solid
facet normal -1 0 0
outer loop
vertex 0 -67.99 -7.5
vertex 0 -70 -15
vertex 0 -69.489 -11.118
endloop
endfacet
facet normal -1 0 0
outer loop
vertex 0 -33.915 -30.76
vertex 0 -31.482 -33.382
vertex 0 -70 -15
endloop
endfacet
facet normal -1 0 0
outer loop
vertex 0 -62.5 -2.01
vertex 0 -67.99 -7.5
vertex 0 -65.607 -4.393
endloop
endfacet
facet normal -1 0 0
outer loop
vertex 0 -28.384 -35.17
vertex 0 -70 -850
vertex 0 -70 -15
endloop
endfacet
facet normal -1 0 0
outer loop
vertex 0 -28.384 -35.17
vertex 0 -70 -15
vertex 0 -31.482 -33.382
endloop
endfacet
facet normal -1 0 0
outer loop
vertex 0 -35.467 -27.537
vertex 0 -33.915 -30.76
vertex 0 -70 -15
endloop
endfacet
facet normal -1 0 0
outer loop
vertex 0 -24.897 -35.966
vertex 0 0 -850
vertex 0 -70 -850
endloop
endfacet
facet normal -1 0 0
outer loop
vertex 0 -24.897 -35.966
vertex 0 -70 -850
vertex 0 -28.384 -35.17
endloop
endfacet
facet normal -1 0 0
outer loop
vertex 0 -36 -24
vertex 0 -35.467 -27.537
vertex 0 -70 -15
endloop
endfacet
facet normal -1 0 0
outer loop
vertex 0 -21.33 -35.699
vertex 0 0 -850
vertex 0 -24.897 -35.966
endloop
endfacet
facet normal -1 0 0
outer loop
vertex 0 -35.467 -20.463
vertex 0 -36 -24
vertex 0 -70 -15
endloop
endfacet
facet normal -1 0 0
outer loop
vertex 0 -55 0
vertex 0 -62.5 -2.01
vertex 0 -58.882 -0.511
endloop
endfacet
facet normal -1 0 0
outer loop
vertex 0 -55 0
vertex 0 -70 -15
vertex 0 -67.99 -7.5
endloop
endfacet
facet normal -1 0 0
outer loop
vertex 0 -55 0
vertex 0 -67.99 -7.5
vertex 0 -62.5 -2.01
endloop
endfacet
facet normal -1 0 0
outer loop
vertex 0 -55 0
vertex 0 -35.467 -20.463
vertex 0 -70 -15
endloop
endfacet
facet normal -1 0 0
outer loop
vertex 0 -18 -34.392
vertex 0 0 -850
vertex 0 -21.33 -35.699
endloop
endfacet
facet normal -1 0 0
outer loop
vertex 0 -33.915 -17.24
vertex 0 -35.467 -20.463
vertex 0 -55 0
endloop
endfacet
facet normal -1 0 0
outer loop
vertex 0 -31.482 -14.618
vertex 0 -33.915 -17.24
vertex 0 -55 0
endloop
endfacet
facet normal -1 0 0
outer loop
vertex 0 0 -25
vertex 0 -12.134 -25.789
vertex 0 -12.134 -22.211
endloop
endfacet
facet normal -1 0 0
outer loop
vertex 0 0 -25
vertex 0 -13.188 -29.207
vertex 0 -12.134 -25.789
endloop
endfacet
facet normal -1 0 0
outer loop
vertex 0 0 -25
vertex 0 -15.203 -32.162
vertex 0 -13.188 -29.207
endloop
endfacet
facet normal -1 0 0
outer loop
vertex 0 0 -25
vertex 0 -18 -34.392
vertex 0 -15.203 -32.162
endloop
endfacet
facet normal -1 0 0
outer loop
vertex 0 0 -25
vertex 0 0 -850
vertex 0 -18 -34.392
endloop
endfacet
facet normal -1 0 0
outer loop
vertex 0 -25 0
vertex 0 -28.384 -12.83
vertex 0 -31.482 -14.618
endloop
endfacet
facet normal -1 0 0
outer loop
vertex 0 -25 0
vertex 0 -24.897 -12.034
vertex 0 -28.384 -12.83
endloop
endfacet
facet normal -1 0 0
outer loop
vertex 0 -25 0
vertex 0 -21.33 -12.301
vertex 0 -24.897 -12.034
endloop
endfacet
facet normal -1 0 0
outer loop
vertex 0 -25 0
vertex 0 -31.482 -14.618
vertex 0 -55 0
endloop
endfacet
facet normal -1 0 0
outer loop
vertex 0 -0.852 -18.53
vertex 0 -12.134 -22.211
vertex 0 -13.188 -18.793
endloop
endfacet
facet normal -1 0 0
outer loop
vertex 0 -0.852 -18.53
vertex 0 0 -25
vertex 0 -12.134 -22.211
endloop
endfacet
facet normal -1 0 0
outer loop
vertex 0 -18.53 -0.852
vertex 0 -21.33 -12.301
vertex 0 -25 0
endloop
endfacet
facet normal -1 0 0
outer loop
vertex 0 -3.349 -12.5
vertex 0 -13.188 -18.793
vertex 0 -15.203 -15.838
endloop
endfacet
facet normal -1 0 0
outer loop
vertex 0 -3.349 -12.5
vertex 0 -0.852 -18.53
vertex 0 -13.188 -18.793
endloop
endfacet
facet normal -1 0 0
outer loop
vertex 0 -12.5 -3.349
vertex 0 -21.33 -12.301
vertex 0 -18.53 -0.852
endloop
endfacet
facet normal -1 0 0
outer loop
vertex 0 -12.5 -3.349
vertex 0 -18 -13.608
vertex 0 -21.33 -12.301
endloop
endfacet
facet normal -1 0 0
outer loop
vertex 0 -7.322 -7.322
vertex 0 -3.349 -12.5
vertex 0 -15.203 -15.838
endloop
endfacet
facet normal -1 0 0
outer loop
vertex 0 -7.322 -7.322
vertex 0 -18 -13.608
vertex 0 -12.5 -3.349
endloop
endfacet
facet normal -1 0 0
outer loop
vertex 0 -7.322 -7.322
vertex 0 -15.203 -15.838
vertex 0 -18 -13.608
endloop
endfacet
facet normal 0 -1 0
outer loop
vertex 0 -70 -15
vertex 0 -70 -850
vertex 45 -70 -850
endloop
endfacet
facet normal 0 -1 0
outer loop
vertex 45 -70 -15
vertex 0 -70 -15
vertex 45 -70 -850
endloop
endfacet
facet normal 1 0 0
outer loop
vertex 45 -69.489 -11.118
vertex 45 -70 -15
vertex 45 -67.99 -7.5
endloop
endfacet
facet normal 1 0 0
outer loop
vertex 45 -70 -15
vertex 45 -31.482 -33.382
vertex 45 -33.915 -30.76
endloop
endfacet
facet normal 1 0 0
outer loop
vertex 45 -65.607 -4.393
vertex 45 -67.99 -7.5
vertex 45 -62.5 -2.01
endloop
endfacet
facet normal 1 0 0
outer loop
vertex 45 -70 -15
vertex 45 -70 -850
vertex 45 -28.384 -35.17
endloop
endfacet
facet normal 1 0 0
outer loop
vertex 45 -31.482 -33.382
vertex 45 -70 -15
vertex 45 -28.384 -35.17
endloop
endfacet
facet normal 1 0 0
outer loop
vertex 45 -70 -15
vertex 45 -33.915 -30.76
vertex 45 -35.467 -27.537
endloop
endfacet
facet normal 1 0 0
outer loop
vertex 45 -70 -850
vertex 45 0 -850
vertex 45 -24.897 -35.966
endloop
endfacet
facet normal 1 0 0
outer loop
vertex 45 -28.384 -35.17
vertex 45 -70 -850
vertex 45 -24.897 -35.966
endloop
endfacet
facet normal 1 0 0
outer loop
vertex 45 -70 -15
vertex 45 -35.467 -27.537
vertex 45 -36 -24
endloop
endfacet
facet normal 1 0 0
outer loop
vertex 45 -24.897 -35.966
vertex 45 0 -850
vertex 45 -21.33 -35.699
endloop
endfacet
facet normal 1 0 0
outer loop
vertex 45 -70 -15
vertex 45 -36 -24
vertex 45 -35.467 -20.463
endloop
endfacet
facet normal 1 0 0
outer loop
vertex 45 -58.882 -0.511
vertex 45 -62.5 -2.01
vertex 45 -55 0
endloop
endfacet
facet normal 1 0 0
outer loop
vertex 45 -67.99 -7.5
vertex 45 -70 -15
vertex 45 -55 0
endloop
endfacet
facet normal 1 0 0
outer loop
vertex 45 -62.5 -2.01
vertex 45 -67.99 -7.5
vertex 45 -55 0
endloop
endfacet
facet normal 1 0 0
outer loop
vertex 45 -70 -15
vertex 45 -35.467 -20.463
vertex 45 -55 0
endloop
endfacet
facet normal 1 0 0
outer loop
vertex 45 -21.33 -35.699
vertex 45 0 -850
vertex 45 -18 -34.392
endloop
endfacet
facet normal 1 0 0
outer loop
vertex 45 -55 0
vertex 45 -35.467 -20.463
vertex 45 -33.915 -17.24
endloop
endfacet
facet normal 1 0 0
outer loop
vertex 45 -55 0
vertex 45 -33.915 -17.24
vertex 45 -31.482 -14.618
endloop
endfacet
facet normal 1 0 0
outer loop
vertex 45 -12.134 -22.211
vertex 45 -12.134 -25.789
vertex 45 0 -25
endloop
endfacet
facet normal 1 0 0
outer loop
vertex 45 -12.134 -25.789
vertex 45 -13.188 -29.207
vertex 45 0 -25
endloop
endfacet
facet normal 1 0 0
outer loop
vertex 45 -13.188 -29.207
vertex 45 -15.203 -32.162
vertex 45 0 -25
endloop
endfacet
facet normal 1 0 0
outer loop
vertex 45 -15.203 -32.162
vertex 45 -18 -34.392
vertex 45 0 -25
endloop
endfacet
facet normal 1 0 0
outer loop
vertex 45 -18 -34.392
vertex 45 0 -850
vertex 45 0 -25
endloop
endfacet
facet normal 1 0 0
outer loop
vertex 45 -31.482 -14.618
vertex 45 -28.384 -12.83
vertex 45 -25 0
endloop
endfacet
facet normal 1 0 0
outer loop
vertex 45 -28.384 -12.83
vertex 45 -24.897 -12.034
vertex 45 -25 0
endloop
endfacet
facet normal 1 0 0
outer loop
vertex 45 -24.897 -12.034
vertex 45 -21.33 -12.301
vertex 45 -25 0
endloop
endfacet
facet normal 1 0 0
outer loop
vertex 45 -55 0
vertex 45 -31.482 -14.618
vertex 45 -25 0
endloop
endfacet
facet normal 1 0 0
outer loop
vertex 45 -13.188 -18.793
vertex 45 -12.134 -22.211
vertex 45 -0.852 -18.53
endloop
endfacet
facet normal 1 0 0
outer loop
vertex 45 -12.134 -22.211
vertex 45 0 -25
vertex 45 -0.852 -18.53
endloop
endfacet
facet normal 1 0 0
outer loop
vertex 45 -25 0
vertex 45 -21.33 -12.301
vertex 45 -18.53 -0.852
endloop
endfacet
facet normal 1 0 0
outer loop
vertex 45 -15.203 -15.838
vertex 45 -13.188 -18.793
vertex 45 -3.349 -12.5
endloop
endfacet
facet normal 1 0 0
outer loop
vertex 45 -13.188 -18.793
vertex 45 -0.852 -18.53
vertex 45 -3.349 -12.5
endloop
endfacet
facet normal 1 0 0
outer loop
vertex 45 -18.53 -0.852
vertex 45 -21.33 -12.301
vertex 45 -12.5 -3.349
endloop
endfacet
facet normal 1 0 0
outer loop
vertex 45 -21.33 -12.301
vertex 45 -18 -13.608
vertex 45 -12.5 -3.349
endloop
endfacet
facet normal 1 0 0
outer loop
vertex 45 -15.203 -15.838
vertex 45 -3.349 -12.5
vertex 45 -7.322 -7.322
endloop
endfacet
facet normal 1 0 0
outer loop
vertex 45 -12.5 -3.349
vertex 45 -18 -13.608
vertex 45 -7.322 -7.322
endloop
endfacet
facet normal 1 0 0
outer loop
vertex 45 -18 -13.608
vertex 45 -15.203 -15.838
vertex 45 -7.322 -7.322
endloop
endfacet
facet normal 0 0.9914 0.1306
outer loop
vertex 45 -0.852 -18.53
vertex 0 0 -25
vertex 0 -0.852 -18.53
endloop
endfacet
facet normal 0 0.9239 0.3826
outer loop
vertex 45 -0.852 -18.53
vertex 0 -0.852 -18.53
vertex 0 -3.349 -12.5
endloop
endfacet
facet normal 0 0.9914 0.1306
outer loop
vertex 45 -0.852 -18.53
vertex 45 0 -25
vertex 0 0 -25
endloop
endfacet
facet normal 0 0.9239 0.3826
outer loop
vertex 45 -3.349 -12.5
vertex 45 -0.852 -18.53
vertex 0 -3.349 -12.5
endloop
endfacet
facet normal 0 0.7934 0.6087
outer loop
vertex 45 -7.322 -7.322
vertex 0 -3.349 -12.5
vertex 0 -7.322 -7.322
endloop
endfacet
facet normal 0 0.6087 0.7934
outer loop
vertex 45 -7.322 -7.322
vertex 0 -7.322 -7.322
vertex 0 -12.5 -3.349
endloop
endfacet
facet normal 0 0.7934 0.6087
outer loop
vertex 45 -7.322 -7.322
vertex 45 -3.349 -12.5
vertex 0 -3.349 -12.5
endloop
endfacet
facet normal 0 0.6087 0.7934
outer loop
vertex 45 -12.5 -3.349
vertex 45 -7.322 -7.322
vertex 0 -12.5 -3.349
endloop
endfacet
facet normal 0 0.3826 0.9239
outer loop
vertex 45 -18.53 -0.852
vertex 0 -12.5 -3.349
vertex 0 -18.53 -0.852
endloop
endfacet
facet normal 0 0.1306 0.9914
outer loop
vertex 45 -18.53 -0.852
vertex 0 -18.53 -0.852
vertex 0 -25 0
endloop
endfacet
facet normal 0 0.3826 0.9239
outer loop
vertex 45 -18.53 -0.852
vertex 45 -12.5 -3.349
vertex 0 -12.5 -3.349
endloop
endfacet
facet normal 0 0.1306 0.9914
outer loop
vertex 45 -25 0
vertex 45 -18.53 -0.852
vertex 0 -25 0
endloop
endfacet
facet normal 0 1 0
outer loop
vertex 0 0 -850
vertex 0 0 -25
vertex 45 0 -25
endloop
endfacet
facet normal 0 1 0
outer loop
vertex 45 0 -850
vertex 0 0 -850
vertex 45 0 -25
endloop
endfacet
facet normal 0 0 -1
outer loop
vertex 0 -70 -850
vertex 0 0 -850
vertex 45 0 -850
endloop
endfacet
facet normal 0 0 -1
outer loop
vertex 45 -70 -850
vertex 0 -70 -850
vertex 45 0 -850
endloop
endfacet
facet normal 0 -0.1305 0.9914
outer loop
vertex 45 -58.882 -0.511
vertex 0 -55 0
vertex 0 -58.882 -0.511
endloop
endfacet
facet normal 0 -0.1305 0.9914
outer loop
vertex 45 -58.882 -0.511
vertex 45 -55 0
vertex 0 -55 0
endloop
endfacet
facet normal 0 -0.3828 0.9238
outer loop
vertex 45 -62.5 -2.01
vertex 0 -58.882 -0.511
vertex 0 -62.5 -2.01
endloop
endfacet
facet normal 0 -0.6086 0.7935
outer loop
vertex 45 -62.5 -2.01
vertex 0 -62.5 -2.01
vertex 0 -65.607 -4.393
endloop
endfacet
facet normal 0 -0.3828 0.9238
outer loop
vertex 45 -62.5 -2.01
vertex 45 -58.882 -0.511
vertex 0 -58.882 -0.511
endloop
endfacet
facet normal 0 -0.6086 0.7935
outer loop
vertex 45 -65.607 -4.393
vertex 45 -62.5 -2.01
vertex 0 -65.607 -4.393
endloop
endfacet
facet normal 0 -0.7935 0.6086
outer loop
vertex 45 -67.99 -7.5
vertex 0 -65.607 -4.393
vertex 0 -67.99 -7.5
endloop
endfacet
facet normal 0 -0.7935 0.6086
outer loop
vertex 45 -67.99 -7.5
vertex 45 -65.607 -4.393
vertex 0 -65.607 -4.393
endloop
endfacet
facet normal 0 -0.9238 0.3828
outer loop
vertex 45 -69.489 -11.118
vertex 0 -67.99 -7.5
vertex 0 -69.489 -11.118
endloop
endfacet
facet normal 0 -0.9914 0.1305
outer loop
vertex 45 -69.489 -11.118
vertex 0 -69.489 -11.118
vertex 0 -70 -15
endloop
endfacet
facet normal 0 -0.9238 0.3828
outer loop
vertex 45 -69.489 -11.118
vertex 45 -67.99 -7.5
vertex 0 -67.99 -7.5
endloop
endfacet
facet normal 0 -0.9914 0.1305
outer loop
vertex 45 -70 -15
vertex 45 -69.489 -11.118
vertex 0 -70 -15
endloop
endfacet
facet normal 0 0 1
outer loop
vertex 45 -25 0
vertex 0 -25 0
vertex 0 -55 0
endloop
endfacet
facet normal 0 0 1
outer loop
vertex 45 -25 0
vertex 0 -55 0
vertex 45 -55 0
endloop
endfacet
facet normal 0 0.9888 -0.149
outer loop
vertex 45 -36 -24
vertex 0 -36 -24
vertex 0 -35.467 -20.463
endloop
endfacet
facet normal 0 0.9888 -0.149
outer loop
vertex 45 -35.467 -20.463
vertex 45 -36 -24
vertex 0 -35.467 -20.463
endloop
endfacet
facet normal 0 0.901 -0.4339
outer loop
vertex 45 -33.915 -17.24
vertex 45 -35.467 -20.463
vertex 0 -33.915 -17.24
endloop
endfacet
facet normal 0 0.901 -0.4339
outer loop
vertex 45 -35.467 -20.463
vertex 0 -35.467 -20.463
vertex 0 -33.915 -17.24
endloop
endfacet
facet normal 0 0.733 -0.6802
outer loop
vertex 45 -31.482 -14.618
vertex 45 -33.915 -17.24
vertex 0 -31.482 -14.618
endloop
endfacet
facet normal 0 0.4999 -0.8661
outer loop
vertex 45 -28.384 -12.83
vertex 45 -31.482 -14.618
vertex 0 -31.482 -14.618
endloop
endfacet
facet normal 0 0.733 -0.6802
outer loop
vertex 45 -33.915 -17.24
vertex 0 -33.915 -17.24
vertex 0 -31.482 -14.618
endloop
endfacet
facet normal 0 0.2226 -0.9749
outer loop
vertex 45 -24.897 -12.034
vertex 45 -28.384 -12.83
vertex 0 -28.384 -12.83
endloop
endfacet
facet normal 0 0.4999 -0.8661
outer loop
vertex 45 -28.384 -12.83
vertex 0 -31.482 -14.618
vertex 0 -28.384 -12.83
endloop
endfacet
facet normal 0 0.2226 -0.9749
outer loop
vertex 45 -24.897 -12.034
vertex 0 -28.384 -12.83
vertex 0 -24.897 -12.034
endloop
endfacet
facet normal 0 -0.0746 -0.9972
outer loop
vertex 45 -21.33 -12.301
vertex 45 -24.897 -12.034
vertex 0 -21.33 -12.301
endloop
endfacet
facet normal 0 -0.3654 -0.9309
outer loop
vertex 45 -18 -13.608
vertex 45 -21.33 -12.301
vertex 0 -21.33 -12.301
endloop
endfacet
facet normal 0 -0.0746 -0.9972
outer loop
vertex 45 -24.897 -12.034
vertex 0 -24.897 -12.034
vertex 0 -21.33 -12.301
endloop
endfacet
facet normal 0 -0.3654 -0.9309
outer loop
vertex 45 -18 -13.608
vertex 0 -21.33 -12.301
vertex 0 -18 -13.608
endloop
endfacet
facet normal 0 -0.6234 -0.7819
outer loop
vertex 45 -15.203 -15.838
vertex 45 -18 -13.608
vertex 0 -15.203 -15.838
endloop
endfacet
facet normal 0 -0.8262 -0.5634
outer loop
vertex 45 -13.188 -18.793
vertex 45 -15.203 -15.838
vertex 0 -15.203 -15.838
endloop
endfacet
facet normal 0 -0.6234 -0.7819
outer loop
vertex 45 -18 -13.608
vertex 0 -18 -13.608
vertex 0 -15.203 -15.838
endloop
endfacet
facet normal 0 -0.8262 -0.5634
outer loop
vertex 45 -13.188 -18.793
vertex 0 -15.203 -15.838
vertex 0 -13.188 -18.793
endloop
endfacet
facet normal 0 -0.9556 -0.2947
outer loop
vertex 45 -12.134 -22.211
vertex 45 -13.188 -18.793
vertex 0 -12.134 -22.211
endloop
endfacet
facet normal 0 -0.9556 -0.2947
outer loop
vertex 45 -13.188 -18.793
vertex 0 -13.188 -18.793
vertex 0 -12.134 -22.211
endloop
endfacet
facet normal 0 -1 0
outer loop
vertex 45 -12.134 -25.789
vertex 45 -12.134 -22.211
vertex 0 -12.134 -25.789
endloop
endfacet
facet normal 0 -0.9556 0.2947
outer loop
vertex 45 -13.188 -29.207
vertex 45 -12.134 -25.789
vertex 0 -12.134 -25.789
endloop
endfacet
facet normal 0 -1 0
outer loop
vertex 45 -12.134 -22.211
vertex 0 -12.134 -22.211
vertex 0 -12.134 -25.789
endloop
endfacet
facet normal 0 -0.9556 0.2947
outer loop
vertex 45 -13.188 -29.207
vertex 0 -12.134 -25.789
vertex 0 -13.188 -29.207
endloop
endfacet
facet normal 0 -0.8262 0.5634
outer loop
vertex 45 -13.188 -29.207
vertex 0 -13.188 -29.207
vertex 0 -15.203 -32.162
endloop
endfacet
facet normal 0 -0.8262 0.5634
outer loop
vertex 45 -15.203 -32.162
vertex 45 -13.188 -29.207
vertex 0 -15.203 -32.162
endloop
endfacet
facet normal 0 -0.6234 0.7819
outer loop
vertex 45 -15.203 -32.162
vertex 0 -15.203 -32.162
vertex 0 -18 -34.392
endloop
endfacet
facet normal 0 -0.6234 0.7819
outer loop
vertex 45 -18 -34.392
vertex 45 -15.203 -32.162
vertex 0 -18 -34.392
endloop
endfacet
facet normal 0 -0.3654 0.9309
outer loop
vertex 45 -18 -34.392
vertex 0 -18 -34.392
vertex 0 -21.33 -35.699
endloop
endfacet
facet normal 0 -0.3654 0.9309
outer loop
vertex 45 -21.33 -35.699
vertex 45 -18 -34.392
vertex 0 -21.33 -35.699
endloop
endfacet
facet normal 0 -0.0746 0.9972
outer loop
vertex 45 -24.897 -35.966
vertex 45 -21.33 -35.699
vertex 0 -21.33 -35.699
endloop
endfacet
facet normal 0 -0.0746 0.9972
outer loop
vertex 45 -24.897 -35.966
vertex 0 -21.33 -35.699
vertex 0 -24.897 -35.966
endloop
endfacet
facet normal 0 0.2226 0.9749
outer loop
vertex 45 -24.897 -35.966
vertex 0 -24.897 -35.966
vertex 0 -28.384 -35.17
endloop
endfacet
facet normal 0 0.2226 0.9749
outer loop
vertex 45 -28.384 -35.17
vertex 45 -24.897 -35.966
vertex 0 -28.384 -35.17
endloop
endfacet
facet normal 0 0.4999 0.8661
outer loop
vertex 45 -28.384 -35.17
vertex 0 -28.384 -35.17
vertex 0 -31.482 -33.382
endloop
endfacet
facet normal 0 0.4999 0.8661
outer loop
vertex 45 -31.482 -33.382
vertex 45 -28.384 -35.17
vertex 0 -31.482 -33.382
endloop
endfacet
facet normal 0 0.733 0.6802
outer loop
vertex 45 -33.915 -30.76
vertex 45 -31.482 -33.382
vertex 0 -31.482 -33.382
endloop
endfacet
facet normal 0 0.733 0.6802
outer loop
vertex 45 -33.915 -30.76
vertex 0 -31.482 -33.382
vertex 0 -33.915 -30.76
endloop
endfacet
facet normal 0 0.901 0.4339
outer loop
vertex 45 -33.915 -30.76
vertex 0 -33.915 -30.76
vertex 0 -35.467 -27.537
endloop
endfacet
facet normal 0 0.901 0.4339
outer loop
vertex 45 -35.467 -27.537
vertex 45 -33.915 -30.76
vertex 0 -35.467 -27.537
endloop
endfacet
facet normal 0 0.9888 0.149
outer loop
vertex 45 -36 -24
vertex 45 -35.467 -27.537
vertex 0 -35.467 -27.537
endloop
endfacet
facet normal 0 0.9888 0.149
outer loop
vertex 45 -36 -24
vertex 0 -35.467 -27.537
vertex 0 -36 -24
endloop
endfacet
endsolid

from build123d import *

# Parameters (mm, degrees)
F0_W     = 45
F0_H     = 850
F1_DEPTH = 70
F2_R     = 12
F3_DEPTH = 45.001
F4_R     = 25
F5_R     = 15


with BuildPart() as f1:
    # F0 (on Front) → F1 (new body)
    with BuildSketch(Plane.XZ):
        with Locations((22.5, -425)):
            Rectangle(F0_W, F0_H)
    extrude(amount=F1_DEPTH)

    # F2 (on face) → F3 (cut, through all)
    with BuildSketch(Plane(origin=(0, 0, 0), x_dir=(0, -1, 0), z_dir=(-1, 0, 0))):
        with Locations((24, -24)):
            Circle(F2_R)
    extrude(amount=-F3_DEPTH, mode=Mode.SUBTRACT)

    # F4
    f4_edges = [f1.edges().sort_by_distance(p)[0] for p in [
        (22.5, 0, 0),
    ]]
    fillet(f4_edges, radius=F4_R)

    # F5
    f5_edges = [f1.edges().sort_by_distance(p)[0] for p in [
        (22.5, -70, 0),
    ]]
    fillet(f5_edges, radius=F5_R)


solid = f1.part
